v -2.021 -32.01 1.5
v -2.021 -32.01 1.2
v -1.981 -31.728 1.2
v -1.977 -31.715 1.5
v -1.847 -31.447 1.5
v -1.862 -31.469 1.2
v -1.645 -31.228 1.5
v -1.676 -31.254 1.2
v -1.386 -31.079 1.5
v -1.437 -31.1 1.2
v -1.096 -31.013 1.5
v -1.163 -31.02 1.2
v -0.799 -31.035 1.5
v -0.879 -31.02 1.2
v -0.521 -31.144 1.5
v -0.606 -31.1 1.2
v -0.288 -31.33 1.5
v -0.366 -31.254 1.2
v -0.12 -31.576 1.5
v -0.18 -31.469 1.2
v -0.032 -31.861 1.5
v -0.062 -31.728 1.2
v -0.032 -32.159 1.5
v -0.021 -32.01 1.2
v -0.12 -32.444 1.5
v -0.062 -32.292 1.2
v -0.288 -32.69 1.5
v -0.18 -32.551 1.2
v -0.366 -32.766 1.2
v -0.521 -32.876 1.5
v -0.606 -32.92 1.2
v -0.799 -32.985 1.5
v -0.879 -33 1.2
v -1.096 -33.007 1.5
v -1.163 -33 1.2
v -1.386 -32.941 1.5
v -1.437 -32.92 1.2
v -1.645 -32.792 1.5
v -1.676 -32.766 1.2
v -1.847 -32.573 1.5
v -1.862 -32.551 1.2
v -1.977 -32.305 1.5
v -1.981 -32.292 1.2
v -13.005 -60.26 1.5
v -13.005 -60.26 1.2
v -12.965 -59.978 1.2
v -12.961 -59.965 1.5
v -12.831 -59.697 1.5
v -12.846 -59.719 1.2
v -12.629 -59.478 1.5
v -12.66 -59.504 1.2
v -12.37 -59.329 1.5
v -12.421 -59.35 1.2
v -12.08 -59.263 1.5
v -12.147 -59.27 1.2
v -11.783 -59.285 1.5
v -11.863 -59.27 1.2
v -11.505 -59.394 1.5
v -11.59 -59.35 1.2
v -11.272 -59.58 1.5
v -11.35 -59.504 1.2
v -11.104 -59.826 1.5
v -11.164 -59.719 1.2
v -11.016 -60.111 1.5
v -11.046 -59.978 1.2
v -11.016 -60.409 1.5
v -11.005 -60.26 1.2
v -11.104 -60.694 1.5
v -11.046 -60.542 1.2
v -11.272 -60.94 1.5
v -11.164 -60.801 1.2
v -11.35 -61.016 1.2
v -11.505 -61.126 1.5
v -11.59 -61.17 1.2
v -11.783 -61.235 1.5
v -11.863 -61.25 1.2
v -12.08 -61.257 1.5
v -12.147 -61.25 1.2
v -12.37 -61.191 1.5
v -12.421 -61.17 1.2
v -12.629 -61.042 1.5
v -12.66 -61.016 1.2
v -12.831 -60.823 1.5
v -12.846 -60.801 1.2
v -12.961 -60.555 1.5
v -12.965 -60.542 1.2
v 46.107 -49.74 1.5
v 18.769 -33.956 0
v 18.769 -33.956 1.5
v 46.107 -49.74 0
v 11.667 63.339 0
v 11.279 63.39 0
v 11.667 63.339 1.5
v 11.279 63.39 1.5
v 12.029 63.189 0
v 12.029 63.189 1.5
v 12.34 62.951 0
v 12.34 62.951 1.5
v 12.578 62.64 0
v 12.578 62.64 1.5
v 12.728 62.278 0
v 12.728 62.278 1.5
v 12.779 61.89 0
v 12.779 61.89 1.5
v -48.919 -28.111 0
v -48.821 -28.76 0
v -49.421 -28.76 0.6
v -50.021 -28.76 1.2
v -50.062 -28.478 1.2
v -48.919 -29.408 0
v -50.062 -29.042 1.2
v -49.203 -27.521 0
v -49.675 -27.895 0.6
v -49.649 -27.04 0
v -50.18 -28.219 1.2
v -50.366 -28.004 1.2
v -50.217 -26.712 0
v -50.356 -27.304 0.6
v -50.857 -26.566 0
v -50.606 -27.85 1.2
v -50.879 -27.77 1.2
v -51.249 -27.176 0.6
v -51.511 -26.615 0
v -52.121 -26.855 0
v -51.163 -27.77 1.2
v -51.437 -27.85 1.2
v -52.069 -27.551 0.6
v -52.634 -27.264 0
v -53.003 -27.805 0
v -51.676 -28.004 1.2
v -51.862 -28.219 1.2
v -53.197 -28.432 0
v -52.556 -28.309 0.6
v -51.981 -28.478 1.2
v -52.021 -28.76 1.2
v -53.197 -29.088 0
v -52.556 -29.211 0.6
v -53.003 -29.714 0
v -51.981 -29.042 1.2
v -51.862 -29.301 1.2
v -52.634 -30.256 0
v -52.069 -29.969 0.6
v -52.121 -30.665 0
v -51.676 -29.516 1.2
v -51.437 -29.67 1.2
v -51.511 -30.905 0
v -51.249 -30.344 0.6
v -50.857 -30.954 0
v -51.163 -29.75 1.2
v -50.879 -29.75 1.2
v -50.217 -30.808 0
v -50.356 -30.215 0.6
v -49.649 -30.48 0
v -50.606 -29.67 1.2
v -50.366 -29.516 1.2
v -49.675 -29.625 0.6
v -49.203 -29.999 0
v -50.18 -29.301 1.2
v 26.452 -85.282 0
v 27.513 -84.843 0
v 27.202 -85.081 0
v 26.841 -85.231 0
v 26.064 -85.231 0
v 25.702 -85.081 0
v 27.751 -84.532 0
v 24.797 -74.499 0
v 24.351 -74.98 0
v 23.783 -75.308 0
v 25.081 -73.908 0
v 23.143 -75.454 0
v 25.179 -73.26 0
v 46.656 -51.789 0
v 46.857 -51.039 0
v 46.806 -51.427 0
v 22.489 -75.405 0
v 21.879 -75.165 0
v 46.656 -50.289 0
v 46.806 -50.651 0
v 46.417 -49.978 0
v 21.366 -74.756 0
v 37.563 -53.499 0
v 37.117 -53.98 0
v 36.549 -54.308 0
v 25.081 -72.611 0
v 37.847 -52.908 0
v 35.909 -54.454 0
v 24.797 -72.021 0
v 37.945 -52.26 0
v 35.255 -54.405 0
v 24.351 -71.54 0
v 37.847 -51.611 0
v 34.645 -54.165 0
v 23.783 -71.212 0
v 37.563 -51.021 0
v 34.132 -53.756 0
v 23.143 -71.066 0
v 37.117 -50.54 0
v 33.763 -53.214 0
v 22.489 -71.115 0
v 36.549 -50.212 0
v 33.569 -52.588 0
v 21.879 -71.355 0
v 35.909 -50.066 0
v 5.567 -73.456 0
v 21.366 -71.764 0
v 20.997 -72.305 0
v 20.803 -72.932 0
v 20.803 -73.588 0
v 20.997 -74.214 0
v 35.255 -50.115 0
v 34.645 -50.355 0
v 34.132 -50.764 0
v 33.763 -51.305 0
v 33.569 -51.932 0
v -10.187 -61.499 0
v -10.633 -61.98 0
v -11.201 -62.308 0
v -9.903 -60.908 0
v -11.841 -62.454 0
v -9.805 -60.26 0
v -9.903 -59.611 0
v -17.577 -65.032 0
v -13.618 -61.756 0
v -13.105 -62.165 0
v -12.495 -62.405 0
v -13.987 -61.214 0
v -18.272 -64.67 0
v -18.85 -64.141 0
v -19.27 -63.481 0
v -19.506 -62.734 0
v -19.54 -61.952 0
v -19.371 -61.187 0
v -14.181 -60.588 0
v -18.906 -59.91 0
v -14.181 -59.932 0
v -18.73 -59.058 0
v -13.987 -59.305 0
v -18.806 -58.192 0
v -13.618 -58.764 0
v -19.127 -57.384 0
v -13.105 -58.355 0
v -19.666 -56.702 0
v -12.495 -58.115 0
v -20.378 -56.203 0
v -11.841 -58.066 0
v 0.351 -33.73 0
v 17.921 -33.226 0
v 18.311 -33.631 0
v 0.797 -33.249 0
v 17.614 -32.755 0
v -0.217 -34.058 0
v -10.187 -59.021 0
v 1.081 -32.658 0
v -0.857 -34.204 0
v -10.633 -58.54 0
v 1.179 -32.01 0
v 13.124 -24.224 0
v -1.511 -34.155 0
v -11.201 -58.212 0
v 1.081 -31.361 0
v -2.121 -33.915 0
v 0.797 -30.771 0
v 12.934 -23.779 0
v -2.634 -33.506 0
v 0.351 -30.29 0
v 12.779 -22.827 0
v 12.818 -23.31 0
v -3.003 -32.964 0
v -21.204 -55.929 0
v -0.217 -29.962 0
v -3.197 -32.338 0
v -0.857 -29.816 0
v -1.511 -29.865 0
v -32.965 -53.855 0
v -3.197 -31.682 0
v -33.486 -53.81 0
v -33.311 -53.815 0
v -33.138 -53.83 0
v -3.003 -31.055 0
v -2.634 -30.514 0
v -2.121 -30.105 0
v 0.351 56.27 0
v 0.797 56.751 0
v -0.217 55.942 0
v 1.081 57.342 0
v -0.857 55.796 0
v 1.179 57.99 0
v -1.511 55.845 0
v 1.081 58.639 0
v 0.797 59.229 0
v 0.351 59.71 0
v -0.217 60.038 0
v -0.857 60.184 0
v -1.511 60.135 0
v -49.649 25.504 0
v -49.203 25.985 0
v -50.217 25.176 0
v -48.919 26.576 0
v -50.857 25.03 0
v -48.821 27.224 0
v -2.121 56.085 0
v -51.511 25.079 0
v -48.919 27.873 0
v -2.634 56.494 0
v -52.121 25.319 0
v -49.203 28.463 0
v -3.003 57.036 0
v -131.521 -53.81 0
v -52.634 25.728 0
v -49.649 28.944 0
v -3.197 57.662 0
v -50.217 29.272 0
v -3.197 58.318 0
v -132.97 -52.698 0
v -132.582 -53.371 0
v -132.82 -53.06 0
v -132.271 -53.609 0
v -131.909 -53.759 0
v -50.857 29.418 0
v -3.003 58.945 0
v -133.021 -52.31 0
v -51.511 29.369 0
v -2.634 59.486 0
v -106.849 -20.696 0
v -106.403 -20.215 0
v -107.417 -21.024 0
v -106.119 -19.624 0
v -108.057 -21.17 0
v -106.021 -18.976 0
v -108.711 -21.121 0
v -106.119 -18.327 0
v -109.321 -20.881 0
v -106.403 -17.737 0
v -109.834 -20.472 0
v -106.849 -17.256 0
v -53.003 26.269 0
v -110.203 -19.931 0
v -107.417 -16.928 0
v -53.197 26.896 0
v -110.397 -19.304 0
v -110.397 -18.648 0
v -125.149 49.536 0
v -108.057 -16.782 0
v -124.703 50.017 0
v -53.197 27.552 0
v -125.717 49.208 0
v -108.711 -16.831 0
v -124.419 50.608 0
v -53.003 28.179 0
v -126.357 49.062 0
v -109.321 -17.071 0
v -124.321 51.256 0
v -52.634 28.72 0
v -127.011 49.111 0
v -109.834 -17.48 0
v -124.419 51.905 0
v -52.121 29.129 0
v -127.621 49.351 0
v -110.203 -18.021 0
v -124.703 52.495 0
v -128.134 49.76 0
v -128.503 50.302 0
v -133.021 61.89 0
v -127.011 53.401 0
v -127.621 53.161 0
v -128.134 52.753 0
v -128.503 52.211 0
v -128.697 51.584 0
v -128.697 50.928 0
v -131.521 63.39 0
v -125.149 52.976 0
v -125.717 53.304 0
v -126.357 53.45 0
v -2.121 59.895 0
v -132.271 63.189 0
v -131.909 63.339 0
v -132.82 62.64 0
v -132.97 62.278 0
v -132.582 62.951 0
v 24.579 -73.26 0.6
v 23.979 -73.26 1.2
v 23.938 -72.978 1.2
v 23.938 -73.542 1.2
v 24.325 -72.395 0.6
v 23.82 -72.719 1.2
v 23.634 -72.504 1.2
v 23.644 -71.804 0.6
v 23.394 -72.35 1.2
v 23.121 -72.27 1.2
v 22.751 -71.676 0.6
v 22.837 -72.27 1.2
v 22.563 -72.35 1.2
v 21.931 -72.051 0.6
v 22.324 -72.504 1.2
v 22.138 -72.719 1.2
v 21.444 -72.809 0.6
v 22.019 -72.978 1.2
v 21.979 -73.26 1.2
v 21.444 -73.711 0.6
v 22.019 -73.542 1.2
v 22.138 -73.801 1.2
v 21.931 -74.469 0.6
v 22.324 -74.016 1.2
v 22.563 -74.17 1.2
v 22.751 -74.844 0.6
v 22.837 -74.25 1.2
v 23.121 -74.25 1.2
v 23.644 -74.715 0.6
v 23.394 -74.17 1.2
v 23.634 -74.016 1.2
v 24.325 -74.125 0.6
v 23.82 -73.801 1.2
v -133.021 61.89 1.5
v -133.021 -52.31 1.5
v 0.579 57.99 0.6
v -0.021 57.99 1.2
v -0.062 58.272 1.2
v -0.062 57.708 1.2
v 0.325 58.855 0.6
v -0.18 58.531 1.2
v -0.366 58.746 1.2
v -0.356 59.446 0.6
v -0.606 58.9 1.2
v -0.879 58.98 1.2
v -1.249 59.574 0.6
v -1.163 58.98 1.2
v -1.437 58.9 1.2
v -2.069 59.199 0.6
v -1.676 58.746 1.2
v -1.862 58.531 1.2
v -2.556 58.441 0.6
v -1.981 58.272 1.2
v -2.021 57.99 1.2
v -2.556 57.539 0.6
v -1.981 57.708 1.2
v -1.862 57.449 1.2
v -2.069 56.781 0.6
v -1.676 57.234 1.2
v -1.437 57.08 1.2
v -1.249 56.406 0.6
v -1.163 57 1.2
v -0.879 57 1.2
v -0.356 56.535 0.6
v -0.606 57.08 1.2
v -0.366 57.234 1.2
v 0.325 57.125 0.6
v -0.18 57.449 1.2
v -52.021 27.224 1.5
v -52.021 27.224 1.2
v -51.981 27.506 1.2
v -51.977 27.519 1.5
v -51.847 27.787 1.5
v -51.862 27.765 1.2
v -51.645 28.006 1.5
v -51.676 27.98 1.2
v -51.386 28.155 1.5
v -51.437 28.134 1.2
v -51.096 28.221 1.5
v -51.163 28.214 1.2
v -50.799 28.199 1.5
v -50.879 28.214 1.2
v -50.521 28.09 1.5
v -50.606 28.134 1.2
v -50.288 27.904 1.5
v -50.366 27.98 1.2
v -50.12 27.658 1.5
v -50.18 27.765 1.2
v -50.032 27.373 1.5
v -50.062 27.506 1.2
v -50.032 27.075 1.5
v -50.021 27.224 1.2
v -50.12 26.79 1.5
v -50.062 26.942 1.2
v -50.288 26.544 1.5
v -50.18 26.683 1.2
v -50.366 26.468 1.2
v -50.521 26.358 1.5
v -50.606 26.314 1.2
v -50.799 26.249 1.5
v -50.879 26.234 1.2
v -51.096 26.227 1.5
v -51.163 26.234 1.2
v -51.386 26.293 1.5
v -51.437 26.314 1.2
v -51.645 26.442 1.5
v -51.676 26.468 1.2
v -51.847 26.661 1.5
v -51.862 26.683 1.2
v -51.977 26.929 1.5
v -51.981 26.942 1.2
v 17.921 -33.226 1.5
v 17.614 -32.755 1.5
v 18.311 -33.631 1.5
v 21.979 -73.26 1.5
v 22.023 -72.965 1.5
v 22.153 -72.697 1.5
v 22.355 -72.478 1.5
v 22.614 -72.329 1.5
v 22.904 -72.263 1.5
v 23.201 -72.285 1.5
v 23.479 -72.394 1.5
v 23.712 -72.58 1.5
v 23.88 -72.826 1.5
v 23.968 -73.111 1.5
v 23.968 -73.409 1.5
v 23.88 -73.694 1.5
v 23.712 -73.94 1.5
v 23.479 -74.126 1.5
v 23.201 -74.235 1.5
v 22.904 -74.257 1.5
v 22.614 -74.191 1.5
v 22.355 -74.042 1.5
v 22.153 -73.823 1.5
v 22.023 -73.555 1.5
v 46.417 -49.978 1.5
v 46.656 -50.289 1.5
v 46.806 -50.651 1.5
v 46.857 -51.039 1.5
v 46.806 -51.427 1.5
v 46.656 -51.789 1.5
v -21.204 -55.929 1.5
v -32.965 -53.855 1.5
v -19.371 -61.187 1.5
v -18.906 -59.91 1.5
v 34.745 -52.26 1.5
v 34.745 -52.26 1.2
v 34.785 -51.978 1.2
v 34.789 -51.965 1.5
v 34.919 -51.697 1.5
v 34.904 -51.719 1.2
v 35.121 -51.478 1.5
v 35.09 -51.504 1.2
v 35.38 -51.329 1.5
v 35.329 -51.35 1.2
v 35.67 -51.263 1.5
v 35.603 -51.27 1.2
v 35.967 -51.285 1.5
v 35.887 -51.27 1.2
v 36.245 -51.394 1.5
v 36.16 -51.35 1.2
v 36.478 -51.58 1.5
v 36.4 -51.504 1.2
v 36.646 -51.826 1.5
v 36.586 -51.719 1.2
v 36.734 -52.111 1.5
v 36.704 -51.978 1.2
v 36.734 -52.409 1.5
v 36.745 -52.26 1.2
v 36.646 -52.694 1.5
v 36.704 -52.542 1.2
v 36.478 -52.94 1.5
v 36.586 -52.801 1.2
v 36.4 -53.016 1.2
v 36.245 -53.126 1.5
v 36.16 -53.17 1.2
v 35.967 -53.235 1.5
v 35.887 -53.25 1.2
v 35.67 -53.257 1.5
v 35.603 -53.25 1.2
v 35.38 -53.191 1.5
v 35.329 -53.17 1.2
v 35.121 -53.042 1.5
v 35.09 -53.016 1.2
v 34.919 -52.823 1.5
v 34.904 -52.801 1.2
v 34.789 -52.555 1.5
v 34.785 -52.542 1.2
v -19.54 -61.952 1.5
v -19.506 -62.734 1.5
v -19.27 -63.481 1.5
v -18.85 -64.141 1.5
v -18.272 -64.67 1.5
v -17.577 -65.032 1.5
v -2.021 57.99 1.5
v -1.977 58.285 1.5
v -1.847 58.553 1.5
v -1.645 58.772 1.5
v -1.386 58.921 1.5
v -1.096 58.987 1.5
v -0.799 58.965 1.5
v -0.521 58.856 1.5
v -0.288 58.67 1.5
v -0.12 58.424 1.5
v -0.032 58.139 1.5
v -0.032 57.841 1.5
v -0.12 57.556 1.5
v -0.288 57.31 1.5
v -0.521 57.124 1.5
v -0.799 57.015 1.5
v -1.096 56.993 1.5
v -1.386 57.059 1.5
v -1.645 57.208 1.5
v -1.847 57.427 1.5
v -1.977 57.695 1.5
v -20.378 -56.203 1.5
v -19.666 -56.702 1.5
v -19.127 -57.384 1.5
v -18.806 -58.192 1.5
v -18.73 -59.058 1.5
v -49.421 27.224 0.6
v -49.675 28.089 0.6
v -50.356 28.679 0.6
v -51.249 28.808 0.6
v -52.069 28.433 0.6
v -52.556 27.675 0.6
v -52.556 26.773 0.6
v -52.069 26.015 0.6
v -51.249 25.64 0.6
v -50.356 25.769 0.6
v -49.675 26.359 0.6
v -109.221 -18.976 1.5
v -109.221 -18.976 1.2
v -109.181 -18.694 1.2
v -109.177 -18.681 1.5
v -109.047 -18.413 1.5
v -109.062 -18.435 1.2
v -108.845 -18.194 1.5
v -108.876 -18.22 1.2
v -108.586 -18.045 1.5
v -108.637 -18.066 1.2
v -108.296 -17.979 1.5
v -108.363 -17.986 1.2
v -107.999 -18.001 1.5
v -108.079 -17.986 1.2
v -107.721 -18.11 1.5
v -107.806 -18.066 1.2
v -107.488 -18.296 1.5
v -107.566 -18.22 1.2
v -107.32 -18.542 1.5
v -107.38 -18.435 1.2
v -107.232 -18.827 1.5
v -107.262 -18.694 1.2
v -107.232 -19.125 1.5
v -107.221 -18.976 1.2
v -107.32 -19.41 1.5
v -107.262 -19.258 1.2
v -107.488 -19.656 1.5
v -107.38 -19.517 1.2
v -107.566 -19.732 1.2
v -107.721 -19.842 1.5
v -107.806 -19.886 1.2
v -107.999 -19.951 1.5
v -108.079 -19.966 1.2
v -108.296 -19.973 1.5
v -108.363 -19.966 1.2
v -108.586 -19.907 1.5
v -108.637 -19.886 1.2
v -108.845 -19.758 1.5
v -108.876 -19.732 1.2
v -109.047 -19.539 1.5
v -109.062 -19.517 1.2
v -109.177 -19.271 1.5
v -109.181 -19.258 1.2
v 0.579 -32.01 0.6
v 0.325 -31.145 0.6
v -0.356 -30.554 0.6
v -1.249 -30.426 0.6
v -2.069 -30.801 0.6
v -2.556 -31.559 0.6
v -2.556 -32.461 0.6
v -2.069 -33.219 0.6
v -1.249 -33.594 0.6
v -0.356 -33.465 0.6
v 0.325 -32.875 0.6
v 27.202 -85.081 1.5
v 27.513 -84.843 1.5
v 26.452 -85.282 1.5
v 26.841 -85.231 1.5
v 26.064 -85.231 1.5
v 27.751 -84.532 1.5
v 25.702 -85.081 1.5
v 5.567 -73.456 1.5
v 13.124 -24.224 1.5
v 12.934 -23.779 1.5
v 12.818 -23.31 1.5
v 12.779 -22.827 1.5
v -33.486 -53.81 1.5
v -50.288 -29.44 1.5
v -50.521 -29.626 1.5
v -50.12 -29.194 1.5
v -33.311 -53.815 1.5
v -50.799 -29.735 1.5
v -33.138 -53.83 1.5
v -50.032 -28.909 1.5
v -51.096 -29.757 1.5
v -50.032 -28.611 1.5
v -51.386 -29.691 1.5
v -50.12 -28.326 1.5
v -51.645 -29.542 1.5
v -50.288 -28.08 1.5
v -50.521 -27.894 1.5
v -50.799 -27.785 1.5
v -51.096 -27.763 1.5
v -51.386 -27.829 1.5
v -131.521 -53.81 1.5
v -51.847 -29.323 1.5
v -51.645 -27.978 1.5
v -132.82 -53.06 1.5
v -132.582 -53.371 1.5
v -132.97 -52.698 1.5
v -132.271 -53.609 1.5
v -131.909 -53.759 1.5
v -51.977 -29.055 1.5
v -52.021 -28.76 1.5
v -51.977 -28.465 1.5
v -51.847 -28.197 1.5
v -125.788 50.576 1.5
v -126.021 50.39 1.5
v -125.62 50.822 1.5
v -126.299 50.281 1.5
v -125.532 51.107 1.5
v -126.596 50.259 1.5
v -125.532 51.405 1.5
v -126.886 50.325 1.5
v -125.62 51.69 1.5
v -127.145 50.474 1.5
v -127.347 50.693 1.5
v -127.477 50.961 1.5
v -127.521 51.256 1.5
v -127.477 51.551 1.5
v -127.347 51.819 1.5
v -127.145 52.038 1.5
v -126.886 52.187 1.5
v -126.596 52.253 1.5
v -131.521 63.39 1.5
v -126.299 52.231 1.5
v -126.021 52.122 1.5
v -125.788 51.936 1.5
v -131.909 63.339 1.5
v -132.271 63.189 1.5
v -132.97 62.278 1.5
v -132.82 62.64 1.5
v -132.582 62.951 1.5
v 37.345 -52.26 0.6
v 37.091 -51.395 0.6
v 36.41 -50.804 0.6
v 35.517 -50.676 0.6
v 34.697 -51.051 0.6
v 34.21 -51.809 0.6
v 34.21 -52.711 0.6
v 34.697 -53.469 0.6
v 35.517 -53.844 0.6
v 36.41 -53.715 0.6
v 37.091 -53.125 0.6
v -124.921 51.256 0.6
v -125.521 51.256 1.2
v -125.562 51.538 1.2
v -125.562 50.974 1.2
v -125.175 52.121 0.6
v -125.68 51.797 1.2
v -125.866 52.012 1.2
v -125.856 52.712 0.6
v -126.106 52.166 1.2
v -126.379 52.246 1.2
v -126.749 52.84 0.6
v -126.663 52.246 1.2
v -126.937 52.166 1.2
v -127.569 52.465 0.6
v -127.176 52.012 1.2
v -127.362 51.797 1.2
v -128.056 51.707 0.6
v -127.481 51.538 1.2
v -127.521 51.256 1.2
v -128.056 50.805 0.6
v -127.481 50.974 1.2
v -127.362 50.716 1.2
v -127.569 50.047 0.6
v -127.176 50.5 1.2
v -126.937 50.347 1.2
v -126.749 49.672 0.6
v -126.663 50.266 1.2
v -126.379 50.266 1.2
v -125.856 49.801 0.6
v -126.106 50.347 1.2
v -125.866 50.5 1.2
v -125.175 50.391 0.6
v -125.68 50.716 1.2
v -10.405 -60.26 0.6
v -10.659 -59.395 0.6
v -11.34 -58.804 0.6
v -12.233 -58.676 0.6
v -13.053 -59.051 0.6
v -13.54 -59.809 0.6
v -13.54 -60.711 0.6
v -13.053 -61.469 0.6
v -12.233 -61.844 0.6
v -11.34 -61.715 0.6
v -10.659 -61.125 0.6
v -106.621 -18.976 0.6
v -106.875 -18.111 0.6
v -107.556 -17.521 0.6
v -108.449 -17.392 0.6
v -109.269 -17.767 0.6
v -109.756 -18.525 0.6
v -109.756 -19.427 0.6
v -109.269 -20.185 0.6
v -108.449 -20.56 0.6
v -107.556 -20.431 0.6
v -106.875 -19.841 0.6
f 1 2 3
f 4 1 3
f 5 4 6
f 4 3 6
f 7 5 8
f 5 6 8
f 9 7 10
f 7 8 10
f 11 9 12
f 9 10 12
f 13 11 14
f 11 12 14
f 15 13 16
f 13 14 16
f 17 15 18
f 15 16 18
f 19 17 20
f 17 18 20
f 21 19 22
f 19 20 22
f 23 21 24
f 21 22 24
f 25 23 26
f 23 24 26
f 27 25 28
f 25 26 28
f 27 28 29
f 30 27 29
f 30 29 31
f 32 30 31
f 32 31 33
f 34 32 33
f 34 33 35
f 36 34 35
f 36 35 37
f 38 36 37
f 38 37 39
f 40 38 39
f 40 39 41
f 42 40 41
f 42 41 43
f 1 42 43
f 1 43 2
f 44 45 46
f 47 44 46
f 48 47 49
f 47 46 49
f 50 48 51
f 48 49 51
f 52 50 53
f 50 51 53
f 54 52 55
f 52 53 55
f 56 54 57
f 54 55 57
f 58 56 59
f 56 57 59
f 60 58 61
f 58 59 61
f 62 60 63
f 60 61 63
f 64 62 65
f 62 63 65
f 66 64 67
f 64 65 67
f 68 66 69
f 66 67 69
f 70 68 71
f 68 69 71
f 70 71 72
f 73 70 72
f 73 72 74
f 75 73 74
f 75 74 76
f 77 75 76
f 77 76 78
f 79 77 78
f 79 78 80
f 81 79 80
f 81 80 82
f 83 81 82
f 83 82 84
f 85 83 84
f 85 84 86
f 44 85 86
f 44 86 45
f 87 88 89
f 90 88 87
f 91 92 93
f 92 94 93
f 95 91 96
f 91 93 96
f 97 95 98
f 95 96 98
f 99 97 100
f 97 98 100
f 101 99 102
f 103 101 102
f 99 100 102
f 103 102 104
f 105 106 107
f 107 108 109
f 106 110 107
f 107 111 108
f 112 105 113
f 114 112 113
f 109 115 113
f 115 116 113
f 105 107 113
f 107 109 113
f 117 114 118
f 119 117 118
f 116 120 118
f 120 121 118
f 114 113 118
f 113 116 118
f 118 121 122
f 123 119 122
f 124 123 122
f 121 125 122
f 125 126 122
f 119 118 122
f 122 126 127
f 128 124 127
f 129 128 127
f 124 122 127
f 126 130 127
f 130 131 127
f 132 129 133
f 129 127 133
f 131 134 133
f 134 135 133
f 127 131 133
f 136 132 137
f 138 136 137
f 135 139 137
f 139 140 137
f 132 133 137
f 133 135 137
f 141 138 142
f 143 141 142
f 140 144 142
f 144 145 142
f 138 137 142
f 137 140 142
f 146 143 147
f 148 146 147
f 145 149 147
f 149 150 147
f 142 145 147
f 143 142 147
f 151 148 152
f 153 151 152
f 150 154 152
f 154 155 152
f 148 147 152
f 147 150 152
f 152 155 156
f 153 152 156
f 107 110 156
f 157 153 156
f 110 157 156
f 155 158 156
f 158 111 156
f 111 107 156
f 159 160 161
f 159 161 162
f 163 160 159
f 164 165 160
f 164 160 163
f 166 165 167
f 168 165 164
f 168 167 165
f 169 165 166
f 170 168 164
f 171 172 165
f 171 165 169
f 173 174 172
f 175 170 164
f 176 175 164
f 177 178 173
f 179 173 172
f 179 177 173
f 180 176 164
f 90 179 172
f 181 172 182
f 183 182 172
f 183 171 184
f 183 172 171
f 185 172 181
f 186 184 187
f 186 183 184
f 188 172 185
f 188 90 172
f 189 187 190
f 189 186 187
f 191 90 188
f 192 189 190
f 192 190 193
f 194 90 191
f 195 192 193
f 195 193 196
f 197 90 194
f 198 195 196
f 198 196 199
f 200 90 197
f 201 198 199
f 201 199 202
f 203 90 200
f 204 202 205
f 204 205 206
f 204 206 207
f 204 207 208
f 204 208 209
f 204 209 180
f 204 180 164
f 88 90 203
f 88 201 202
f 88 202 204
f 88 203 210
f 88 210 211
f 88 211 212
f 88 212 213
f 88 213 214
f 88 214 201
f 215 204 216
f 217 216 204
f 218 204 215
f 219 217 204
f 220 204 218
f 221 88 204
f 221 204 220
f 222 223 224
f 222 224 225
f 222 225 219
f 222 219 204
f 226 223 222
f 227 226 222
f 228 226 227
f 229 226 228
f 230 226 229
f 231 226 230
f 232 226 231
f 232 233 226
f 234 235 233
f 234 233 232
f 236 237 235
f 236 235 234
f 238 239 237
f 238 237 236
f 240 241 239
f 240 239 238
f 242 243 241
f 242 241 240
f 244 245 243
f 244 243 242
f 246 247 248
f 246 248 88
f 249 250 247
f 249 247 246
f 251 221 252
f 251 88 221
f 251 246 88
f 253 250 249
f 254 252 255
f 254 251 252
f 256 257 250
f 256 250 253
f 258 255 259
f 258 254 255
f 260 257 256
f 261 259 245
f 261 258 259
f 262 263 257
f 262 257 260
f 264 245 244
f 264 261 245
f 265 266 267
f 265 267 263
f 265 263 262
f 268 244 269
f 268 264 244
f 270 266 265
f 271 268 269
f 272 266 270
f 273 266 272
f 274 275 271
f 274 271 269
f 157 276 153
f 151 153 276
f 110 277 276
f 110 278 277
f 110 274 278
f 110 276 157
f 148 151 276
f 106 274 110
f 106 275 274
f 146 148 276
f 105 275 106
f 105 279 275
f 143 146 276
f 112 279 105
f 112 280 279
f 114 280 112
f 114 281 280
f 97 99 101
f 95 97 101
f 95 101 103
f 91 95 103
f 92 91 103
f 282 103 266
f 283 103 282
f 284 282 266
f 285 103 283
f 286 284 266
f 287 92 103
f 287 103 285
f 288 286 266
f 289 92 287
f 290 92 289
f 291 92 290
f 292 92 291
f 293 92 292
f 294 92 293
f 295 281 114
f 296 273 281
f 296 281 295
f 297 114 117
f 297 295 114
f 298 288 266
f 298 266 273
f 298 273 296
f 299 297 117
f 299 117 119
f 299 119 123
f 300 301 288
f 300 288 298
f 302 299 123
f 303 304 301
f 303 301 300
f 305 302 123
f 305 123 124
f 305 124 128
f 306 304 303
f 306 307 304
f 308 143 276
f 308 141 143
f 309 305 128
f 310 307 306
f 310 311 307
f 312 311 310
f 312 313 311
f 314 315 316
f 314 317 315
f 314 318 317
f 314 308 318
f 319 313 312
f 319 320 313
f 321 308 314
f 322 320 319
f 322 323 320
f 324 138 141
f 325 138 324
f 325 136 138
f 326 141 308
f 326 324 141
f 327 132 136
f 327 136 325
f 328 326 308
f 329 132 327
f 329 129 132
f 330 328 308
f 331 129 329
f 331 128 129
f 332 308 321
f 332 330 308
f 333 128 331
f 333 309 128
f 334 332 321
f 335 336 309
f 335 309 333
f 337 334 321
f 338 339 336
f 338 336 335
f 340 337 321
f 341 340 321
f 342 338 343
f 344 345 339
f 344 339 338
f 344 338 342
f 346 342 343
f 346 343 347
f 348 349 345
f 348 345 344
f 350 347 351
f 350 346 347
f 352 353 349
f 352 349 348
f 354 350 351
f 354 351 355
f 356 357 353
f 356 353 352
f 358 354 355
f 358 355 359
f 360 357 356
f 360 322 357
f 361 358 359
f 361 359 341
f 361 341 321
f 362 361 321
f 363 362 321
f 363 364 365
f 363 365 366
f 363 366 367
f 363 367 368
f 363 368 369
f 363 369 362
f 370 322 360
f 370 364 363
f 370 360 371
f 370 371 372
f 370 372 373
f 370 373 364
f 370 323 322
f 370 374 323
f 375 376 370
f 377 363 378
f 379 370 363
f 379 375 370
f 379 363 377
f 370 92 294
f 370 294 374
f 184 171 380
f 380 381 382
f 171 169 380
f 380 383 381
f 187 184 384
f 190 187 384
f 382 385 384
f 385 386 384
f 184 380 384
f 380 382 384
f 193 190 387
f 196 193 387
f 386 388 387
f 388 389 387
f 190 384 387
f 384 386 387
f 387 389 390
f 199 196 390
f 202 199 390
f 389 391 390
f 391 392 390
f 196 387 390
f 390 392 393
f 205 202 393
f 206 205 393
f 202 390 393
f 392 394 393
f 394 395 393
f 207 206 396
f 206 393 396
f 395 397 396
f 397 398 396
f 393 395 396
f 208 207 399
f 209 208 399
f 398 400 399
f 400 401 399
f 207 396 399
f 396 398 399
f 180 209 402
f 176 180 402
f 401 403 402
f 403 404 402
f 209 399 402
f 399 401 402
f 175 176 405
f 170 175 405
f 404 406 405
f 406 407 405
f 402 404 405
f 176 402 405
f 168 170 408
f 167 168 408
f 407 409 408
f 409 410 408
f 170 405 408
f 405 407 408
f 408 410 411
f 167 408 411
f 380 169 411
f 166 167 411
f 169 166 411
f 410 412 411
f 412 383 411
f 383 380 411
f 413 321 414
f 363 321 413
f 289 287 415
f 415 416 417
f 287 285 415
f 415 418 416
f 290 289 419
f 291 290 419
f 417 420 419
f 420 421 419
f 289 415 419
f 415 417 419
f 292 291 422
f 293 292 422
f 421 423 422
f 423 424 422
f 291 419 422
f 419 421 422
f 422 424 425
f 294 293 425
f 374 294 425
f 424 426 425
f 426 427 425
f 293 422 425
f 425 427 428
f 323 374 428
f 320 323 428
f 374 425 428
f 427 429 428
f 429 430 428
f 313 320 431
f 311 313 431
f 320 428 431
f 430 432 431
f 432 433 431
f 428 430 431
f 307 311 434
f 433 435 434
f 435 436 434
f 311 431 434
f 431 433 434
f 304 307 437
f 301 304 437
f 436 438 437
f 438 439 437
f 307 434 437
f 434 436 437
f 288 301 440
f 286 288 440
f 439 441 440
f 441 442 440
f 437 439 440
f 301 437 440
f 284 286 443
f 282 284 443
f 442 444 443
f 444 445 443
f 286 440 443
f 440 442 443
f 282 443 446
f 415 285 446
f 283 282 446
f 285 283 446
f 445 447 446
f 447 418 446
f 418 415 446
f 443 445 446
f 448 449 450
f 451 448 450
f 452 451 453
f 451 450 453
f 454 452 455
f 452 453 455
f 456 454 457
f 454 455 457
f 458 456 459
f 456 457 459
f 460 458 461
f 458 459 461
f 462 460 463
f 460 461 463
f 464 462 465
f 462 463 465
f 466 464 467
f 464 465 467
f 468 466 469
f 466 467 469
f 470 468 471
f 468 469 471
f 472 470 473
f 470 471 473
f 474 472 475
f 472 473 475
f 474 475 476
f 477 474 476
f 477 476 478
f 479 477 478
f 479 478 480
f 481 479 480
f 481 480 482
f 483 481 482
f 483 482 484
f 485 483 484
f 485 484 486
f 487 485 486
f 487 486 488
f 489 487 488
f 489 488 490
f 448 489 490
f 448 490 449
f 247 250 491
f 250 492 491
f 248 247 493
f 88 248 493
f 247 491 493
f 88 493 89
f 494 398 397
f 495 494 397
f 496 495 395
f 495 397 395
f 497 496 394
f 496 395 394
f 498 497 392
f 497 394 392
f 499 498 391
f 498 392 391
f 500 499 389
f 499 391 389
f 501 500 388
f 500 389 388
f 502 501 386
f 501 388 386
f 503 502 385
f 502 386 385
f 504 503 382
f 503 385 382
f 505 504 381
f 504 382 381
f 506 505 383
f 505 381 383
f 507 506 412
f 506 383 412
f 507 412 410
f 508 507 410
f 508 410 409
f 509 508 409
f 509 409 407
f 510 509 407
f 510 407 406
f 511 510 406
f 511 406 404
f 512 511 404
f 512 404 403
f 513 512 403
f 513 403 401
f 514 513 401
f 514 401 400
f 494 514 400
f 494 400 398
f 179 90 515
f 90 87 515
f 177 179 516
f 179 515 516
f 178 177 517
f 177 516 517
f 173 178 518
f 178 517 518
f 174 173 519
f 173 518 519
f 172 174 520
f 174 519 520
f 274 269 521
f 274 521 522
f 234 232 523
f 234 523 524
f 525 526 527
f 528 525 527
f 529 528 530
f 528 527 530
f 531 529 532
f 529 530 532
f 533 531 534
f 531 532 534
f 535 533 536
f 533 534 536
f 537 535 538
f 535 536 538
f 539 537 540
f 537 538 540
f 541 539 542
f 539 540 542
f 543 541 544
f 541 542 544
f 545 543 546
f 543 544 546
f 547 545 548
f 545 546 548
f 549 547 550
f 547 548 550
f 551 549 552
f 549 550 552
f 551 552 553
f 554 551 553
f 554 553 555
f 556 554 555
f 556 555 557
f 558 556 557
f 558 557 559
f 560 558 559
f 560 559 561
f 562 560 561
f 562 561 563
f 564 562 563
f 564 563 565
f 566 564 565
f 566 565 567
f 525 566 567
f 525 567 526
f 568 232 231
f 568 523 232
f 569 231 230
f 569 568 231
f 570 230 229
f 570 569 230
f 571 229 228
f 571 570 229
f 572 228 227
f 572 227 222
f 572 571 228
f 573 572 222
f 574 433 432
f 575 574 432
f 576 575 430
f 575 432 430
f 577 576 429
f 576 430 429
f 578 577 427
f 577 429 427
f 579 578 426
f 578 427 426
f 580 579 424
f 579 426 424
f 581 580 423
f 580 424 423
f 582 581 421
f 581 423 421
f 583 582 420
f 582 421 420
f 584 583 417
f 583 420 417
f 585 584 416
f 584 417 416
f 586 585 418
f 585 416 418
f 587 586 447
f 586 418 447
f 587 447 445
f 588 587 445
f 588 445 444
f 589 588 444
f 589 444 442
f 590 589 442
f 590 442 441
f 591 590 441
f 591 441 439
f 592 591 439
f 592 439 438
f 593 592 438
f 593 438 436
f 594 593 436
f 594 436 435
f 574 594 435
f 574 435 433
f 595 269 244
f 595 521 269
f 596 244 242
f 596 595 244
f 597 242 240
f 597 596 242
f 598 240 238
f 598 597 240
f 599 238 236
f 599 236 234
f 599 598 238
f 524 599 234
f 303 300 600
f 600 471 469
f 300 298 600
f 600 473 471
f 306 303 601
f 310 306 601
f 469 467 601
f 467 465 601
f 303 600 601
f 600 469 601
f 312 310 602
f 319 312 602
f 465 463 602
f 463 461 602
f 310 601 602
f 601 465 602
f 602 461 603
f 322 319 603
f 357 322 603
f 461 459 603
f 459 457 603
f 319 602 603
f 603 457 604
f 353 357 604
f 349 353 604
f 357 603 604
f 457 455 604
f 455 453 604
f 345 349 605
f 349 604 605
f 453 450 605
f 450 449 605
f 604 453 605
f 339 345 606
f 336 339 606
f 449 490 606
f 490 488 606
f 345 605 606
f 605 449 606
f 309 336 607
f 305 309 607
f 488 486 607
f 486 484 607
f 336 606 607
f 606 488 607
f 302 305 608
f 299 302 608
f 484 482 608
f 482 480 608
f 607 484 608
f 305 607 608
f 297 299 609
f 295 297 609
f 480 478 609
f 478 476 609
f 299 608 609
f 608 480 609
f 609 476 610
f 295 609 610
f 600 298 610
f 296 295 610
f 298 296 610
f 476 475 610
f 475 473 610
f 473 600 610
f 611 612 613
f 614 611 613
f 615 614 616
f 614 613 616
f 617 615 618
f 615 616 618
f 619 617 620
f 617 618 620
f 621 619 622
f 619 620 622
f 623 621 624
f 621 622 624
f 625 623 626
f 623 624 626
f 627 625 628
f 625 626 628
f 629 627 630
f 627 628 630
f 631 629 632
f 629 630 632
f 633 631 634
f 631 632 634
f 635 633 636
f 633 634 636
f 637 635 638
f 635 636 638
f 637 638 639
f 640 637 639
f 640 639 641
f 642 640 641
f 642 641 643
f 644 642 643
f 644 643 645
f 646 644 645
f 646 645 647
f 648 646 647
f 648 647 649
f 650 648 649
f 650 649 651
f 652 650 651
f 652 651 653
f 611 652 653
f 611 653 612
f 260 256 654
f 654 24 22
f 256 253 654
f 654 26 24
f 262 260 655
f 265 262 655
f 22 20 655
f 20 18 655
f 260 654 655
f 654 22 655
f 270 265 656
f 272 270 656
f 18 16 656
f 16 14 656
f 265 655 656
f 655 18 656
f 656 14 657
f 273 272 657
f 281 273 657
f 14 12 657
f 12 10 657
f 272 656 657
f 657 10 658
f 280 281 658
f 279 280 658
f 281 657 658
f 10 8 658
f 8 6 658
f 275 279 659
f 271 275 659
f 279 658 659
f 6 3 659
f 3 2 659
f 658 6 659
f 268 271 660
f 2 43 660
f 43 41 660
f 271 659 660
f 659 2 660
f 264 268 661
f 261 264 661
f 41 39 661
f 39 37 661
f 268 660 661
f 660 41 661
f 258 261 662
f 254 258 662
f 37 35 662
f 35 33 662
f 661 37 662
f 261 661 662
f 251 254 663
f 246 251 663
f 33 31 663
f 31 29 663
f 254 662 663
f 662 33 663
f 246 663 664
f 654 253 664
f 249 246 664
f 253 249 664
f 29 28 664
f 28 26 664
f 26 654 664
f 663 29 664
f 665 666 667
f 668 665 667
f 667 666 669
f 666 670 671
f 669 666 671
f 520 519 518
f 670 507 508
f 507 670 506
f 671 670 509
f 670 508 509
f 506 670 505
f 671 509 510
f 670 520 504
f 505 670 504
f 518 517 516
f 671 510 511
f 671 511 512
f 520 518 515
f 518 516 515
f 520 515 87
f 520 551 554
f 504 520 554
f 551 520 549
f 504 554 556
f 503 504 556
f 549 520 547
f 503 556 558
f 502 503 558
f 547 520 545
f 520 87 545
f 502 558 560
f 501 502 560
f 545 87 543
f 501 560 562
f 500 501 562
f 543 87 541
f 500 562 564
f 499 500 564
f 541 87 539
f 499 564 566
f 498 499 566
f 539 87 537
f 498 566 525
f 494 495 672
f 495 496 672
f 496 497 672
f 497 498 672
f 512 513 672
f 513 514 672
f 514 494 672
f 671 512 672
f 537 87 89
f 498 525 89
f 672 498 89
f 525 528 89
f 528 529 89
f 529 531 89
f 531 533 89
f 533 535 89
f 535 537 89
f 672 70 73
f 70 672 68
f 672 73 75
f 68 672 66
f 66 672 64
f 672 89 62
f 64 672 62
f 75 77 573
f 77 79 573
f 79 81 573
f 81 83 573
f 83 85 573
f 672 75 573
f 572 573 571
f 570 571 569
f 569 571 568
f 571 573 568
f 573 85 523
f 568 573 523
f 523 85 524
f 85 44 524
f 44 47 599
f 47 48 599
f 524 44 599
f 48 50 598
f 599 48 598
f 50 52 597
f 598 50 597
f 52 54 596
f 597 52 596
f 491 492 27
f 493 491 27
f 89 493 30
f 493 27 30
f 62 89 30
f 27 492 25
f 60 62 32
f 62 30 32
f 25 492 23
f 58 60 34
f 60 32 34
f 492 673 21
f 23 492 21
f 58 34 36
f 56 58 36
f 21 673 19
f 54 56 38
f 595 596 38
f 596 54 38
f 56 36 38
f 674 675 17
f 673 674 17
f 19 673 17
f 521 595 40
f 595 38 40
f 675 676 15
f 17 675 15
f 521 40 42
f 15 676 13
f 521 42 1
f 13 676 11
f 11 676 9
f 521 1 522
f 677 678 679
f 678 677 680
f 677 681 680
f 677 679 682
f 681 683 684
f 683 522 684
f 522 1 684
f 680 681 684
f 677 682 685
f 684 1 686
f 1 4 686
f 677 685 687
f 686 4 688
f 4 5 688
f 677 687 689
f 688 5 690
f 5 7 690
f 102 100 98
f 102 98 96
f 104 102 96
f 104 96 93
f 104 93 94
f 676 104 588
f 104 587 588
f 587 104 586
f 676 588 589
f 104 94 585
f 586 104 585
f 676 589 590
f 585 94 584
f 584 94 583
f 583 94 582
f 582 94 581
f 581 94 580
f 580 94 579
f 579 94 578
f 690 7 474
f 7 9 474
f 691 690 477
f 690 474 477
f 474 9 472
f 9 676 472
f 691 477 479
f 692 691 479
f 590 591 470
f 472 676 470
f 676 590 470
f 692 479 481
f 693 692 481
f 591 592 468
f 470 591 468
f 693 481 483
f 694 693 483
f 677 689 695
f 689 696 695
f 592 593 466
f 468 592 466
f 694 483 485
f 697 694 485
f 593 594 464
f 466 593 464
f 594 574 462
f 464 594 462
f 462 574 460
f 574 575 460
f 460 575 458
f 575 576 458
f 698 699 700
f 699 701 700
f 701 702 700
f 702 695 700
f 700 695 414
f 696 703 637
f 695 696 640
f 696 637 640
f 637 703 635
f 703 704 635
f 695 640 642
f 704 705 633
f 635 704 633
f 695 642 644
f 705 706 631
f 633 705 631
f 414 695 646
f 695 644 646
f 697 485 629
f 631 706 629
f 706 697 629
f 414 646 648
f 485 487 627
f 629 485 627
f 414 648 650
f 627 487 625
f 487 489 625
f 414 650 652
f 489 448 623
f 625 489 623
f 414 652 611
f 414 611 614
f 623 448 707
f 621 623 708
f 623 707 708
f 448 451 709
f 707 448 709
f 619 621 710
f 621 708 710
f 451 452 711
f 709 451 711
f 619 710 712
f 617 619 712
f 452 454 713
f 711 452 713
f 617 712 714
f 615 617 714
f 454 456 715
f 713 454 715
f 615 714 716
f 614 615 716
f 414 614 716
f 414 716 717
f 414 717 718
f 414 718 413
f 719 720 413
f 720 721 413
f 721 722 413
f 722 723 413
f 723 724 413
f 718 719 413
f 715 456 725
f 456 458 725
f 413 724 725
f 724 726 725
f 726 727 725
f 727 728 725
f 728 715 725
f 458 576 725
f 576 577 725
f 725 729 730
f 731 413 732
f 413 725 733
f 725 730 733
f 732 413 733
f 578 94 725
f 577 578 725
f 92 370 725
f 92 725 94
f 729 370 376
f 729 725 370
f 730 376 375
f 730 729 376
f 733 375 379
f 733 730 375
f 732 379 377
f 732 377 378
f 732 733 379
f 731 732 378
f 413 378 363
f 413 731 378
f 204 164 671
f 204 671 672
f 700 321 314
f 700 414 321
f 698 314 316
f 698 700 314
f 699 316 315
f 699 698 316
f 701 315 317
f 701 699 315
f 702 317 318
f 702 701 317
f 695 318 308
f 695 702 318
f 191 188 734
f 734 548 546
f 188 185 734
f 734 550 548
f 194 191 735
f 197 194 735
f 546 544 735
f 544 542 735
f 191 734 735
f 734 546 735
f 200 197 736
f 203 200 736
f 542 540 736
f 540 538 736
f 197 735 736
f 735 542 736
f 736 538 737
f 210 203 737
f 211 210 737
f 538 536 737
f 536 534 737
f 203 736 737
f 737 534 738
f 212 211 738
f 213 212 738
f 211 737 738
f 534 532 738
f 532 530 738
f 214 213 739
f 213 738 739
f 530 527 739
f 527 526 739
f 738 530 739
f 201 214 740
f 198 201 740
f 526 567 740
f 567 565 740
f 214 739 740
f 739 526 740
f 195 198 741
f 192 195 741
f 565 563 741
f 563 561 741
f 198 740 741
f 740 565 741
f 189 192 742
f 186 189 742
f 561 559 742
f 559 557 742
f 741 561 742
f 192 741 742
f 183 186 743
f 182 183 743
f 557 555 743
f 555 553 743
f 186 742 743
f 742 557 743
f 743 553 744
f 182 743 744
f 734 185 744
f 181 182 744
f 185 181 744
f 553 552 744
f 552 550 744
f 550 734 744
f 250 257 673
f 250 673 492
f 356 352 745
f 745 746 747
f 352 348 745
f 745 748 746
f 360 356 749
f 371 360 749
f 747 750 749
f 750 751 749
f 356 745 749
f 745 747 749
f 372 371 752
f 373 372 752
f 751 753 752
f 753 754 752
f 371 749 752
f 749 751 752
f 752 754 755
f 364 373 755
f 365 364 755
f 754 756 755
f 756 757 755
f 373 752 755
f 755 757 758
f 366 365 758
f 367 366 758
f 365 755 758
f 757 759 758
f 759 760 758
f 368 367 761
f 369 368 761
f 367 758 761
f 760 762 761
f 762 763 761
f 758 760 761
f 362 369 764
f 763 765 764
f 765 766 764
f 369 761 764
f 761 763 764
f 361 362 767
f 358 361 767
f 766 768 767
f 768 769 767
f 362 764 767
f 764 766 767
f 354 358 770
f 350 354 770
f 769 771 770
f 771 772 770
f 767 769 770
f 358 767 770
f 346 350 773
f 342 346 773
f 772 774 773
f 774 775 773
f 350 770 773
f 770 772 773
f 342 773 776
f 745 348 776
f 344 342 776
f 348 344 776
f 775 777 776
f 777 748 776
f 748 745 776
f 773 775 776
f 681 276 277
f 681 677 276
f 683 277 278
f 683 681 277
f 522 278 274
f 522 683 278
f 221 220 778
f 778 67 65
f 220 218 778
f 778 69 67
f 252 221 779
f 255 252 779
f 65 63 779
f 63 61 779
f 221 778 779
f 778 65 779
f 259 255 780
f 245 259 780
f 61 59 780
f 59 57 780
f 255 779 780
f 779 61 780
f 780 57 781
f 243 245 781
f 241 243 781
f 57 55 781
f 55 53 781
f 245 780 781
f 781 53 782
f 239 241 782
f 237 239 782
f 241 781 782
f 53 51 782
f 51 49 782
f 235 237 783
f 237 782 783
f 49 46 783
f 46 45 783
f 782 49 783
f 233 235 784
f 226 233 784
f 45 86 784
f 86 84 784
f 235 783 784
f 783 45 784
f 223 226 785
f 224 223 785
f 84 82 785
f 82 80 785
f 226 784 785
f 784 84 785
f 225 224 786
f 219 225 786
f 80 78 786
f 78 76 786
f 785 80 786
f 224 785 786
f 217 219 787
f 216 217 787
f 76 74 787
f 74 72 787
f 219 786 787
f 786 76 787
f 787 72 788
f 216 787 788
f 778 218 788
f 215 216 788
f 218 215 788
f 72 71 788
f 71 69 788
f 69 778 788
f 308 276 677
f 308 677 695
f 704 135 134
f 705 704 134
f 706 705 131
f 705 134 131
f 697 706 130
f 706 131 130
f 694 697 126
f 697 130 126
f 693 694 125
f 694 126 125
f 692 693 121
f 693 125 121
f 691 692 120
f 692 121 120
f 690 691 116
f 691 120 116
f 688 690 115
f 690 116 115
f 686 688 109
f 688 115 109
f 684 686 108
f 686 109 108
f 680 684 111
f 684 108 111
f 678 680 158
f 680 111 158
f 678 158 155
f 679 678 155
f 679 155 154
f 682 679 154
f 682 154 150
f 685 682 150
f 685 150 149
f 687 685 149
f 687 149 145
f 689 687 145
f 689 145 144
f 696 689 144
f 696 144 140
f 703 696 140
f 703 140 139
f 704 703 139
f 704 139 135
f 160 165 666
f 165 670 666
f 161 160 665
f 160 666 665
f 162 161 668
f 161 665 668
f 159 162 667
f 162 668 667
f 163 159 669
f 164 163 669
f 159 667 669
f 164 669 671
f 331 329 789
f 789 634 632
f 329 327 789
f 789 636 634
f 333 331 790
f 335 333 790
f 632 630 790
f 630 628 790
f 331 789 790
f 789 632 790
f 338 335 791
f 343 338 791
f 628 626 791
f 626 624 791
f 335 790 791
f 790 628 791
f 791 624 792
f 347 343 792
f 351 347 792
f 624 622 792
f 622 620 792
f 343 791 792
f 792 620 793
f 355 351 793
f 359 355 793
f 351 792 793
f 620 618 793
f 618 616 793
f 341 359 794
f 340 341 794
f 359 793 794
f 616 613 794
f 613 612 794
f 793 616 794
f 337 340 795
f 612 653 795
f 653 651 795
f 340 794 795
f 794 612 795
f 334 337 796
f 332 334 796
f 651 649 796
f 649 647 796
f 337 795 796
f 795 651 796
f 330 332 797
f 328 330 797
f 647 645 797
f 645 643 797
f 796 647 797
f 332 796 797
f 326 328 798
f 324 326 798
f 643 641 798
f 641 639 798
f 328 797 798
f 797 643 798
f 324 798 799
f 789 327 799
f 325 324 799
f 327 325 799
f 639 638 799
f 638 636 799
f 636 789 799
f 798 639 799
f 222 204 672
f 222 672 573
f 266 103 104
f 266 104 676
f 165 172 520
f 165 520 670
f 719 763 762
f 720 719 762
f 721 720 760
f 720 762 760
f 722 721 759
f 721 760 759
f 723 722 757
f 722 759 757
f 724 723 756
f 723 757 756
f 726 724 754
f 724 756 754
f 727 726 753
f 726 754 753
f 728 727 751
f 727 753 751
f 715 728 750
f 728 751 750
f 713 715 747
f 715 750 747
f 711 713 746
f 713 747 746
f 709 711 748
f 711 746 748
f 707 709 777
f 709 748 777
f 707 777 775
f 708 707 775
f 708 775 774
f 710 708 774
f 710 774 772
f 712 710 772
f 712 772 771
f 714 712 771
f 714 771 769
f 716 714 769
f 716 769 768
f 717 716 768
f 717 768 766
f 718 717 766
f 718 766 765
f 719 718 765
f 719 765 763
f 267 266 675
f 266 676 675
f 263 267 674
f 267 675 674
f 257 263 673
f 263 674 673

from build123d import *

# Parameters (mm, degrees)
BOSS_EXTRUDE1_DEPTH = 1.5
SKETCH6_R           = 1
CUT_EXTRUDE1_DEPTH  = 10
FILLET4_R           = 1.5
FILLET5_R           = 3


# Read off the part's stored shape, not the designer's step: AdvancedHole1
with BuildPart() as part:
    # Sketch1 → Boss-Extrude1 (new body)
    with BuildSketch(Plane.XY):
        Polygon((-133.021138037, 63.390093572), (12.778856844, 63.390093572), (12.778856844, -23.568490874), (18.017758559, -33.522553443), (47.405744057, -50.489714781), (27.001354783, -85.831153701), (5.566925134, -73.455979973), (-20.396575573, -64.006038538), (-17.68284447, -56.550123611), (-33.223388364, -53.809906428), (-133.021138037, -53.809906428), align=None)
    extrude(amount=BOSS_EXTRUDE1_DEPTH)

    # Sketch6 → Cut-Extrude1 (cut)
    with BuildSketch(Plane(origin=(0, 0, 0), x_dir=(-1, 0, 0), z_dir=(0, 0, -1))):
        with Locations((126.521138037, 51.256145572)):
            Circle(SKETCH6_R)
        with Locations((108.221138037, -18.975958428)):
            Circle(SKETCH6_R)
        with Locations((51.021138037, -28.759906428)):
            Circle(SKETCH6_R)
        with Locations((51.021138037, 27.224041572)):
            Circle(SKETCH6_R)
        with Locations((1.021138037, 57.990093572)):
            Circle(SKETCH6_R)
        with Locations((1.021138037, -32.009906428)):
            Circle(SKETCH6_R)
        with Locations((12.005086037, -60.259906428)):
            Circle(SKETCH6_R)
        with Locations((-35.744913963, -52.259906428)):
            Circle(SKETCH6_R)
        with Locations((-22.978861963, -73.259906428)):
            Circle(SKETCH6_R)
    extrude(amount=-CUT_EXTRUDE1_DEPTH, mode=Mode.SUBTRACT)

    # AdvancedHole1 outline → AdvancedHole1 (revolve, cut)
    with BuildSketch(Plane(origin=(35.744913963, -52.259906428, 0), x_dir=(1, 0, 0), z_dir=(0, -1, 0))):
        Polygon((2.2, 0), (1, 1.2), (1, 0), align=None)
    revolve(axis=Axis((35.744913963, -52.259906428, 0), (0, 0, 1)), mode=Mode.SUBTRACT)

    # AdvancedHole1 2 outline → AdvancedHole1 2 (revolve, cut)
    with BuildSketch(Plane(origin=(22.978861963, -73.259906428, 0), x_dir=(1, 0, 0), z_dir=(0, -1, 0))):
        Polygon((2.2, 0), (1, 1.2), (1, 0), align=None)
    revolve(axis=Axis((22.978861963, -73.259906428, 0), (0, 0, 1)), mode=Mode.SUBTRACT)

    # AdvancedHole1 3 outline → AdvancedHole1 3 (revolve, cut)
    with BuildSketch(Plane(origin=(-12.005086037, -60.259906428, 0), x_dir=(1, 0, 0), z_dir=(0, -1, 0))):
        Polygon((2.2, 0), (1, 1.2), (1, 0), align=None)
    revolve(axis=Axis((-12.005086037, -60.259906428, 0), (0, 0, 1)), mode=Mode.SUBTRACT)

    # AdvancedHole1 4 outline → AdvancedHole1 4 (revolve, cut)
    with BuildSketch(Plane(origin=(-1.021138037, -32.009906428, 0), x_dir=(1, 0, 0), z_dir=(0, -1, 0))):
        Polygon((2.2, 0), (1, 1.2), (1, 0), align=None)
    revolve(axis=Axis((-1.021138037, -32.009906428, 0), (0, 0, 1)), mode=Mode.SUBTRACT)

    # AdvancedHole1 5 outline → AdvancedHole1 5 (revolve, cut)
    with BuildSketch(Plane(origin=(-51.021138037, -28.759906428, 0), x_dir=(1, 0, 0), z_dir=(0, -1, 0))):
        Polygon((2.2, 0), (1, 1.2), (1, 0), align=None)
    revolve(axis=Axis((-51.021138037, -28.759906428, 0), (0, 0, 1)), mode=Mode.SUBTRACT)

    # AdvancedHole1 6 outline → AdvancedHole1 6 (revolve, cut)
    with BuildSketch(Plane(origin=(-108.221138037, -18.975958428, 0), x_dir=(1, 0, 0), z_dir=(0, -1, 0))):
        Polygon((2.2, 0), (1, 1.2), (1, 0), align=None)
    revolve(axis=Axis((-108.221138037, -18.975958428, 0), (0, 0, 1)), mode=Mode.SUBTRACT)

    # AdvancedHole1 7 outline → AdvancedHole1 7 (revolve, cut)
    with BuildSketch(Plane(origin=(-126.521138037, 51.256145572, 0), x_dir=(1, 0, 0), z_dir=(0, -1, 0))):
        Polygon((2.2, 0), (1, 1.2), (1, 0), align=None)
    revolve(axis=Axis((-126.521138037, 51.256145572, 0), (0, 0, 1)), mode=Mode.SUBTRACT)

    # AdvancedHole1 8 outline → AdvancedHole1 8 (revolve, cut)
    with BuildSketch(Plane(origin=(-51.021138037, 27.224041572, 0), x_dir=(1, 0, 0), z_dir=(0, -1, 0))):
        Polygon((2.2, 0), (1, 1.2), (1, 0), align=None)
    revolve(axis=Axis((-51.021138037, 27.224041572, 0), (0, 0, 1)), mode=Mode.SUBTRACT)

    # AdvancedHole1 9 outline → AdvancedHole1 9 (revolve, cut)
    with BuildSketch(Plane(origin=(-1.021138037, 57.990093572, 0), x_dir=(1, 0, 0), z_dir=(0, -1, 0))):
        Polygon((2.2, 0), (1, 1.2), (1, 0), align=None)
    revolve(axis=Axis((-1.021138037, 57.990093572, 0), (0, 0, 1)), mode=Mode.SUBTRACT)

    # Fillet4
    fillet4_edges = [part.edges().sort_by_distance(p)[0] for p in [
        (-133.021138037, 63.390093572, 0.75),
        (12.778856844, 63.390093572, 0.75),
        (47.405744057, -50.489714781, 0.75),
        (27.001354783, -85.831153701, 0.75),
        (-133.021138037, -53.809906428, 0.75),
    ]]
    fillet(fillet4_edges, radius=FILLET4_R)

    # Fillet5
    fillet5_edges = [part.edges().sort_by_distance(p)[0] for p in [
        (12.778856844, -23.568490874, 0.75),
        (18.017758559, -33.522553443, 0.75),
        (-20.396575573, -64.006038538, 0.75),
        (-17.68284447, -56.550123611, 0.75),
        (-33.223388364, -53.809906428, 0.75),
    ]]
    fillet(fillet5_edges, radius=FILLET5_R)


solid = part.part
